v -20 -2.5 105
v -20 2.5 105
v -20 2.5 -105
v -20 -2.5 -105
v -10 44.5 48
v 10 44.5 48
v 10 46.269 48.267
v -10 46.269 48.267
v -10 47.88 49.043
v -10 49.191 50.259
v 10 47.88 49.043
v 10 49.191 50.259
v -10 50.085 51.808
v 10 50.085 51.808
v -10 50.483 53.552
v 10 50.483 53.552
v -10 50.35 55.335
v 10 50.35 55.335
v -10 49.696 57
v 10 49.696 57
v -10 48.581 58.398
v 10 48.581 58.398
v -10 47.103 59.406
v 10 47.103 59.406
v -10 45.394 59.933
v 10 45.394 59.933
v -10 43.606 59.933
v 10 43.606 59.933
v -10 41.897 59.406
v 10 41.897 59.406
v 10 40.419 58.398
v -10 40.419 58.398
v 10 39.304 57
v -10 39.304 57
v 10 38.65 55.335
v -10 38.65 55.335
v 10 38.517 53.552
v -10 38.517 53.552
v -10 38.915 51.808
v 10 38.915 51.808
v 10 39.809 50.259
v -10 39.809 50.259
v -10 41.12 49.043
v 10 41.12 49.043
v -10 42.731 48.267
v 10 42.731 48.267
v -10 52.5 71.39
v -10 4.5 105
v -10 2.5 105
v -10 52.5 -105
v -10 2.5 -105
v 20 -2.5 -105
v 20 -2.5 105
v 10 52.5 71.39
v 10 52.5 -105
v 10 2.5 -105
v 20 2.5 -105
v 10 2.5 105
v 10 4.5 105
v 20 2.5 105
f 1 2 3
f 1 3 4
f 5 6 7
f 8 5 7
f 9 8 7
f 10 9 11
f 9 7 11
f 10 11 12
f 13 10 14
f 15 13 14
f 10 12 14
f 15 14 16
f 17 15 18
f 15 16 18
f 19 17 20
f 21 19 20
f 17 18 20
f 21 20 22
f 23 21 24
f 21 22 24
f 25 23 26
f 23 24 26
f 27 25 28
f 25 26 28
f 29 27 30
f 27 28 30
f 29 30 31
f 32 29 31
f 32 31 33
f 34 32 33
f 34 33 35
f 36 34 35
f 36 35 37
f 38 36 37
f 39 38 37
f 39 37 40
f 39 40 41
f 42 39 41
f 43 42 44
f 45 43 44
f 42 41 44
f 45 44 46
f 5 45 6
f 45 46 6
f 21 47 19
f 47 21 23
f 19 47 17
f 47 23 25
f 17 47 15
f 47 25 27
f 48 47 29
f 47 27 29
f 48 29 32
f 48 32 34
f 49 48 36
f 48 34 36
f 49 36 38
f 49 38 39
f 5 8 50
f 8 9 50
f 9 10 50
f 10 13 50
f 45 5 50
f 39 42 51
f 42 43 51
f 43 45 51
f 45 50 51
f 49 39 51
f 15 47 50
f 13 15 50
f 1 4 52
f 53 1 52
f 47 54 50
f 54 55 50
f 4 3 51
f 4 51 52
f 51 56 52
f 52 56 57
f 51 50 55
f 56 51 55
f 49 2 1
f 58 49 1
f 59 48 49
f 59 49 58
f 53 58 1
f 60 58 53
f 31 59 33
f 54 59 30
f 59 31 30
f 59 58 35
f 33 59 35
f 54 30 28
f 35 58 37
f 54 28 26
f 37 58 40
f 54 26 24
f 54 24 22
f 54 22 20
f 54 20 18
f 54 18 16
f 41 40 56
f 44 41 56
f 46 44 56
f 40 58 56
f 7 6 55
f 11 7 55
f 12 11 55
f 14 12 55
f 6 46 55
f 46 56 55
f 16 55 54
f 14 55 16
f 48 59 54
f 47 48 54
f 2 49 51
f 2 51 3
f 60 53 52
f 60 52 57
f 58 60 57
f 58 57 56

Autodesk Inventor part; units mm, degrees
ref_plane "YZ Plane" through (0, 0, 0) normal (1, 0, 0) x (0, 1, 0)
ref_plane "XZ Plane" through (0, 0, 0) normal (0, 1, 0) x (-1, 0, 0)
ref_plane "XY Plane" through (0, 0, 0) normal (0, 0, 1) x (1, 0, 0)
sketch "スケッチ1" plane through (0, 0, 0) normal (0, 0, 1) x (1, 0, 0)
  line L0 (-20, -2.5) -> (20, -2.5)
  line L1 (20, -2.5) -> (20, 2.5)
  line L2 (-20, 2.5) -> (-20, -2.5)
  line L3 (-20, -2.5) -> (20, 2.5) construction
  line L4 (20, -2.5) -> (-20, 2.5) construction
  line L5 (-10, 2.5) -> (10, 2.5)
  line L6 (10, 2.5) -> (10, 52.5)
  line L7 (10, 52.5) -> (-10, 52.5)
  line L8 (-10, 52.5) -> (-10, 2.5)
  line L9 (-10, 2.5) -> (10, 52.5) construction
  line L10 (10, 2.5) -> (-10, 52.5) construction
  line L11 (20, 2.5) -> (10, 2.5)
  line L12 (-10, 2.5) -> (-20, 2.5)
  point P0 (0, 0)
  point P1 (0, 27.5)
  point P2 (0, 27.5)
  point P3 (0, 0)
  dimension "d0" = 20
  dimension "d1" = 50
  dimension "d2" = 5
  dimension "d3" = 10
extrude "押し出し1" add sketch "スケッチ1" along normal mid plane 210
sketch "スケッチ4" plane through (20, -2.5, 105) normal (1, 0, 0) x (0, 0, -1)
  line L0 (0, 7) -> (33.61, 55)
  line L1 (210, 55) -> (0, 55) projected
  line L2 (0, 5) -> (0, 55) projected
  line L3 (210, 5) -> (0, 5) projected
  line L4 (210, 55) -> (210, 5) projected
  line L5 (0, 0) -> (0, 5) projected
  point P0 (105, 2.5)
  dimension "d18" = 35
  dimension "d21" = 2
extrude "押し出し3" cut sketch "スケッチ4" against normal through all contours L2 L1 L0
sketch "スケッチ6" plane through (10, 2.5, -105) normal (1, 0, 0) x (0, 0, -1)
  circle A0 centre (-159, 42) radius 6
  line L0 (0, 0) -> (-210, 0) projected
  line L1 (-210, -5) -> (-210, 0) projected
  point P0 (-105, -2.5)
  dimension "d33" = 12
  dimension "d34" = 42
  dimension "d35" = 51
extrude "押し出し4" cut sketch "スケッチ6" against normal through all
properties part number "s_base2"
